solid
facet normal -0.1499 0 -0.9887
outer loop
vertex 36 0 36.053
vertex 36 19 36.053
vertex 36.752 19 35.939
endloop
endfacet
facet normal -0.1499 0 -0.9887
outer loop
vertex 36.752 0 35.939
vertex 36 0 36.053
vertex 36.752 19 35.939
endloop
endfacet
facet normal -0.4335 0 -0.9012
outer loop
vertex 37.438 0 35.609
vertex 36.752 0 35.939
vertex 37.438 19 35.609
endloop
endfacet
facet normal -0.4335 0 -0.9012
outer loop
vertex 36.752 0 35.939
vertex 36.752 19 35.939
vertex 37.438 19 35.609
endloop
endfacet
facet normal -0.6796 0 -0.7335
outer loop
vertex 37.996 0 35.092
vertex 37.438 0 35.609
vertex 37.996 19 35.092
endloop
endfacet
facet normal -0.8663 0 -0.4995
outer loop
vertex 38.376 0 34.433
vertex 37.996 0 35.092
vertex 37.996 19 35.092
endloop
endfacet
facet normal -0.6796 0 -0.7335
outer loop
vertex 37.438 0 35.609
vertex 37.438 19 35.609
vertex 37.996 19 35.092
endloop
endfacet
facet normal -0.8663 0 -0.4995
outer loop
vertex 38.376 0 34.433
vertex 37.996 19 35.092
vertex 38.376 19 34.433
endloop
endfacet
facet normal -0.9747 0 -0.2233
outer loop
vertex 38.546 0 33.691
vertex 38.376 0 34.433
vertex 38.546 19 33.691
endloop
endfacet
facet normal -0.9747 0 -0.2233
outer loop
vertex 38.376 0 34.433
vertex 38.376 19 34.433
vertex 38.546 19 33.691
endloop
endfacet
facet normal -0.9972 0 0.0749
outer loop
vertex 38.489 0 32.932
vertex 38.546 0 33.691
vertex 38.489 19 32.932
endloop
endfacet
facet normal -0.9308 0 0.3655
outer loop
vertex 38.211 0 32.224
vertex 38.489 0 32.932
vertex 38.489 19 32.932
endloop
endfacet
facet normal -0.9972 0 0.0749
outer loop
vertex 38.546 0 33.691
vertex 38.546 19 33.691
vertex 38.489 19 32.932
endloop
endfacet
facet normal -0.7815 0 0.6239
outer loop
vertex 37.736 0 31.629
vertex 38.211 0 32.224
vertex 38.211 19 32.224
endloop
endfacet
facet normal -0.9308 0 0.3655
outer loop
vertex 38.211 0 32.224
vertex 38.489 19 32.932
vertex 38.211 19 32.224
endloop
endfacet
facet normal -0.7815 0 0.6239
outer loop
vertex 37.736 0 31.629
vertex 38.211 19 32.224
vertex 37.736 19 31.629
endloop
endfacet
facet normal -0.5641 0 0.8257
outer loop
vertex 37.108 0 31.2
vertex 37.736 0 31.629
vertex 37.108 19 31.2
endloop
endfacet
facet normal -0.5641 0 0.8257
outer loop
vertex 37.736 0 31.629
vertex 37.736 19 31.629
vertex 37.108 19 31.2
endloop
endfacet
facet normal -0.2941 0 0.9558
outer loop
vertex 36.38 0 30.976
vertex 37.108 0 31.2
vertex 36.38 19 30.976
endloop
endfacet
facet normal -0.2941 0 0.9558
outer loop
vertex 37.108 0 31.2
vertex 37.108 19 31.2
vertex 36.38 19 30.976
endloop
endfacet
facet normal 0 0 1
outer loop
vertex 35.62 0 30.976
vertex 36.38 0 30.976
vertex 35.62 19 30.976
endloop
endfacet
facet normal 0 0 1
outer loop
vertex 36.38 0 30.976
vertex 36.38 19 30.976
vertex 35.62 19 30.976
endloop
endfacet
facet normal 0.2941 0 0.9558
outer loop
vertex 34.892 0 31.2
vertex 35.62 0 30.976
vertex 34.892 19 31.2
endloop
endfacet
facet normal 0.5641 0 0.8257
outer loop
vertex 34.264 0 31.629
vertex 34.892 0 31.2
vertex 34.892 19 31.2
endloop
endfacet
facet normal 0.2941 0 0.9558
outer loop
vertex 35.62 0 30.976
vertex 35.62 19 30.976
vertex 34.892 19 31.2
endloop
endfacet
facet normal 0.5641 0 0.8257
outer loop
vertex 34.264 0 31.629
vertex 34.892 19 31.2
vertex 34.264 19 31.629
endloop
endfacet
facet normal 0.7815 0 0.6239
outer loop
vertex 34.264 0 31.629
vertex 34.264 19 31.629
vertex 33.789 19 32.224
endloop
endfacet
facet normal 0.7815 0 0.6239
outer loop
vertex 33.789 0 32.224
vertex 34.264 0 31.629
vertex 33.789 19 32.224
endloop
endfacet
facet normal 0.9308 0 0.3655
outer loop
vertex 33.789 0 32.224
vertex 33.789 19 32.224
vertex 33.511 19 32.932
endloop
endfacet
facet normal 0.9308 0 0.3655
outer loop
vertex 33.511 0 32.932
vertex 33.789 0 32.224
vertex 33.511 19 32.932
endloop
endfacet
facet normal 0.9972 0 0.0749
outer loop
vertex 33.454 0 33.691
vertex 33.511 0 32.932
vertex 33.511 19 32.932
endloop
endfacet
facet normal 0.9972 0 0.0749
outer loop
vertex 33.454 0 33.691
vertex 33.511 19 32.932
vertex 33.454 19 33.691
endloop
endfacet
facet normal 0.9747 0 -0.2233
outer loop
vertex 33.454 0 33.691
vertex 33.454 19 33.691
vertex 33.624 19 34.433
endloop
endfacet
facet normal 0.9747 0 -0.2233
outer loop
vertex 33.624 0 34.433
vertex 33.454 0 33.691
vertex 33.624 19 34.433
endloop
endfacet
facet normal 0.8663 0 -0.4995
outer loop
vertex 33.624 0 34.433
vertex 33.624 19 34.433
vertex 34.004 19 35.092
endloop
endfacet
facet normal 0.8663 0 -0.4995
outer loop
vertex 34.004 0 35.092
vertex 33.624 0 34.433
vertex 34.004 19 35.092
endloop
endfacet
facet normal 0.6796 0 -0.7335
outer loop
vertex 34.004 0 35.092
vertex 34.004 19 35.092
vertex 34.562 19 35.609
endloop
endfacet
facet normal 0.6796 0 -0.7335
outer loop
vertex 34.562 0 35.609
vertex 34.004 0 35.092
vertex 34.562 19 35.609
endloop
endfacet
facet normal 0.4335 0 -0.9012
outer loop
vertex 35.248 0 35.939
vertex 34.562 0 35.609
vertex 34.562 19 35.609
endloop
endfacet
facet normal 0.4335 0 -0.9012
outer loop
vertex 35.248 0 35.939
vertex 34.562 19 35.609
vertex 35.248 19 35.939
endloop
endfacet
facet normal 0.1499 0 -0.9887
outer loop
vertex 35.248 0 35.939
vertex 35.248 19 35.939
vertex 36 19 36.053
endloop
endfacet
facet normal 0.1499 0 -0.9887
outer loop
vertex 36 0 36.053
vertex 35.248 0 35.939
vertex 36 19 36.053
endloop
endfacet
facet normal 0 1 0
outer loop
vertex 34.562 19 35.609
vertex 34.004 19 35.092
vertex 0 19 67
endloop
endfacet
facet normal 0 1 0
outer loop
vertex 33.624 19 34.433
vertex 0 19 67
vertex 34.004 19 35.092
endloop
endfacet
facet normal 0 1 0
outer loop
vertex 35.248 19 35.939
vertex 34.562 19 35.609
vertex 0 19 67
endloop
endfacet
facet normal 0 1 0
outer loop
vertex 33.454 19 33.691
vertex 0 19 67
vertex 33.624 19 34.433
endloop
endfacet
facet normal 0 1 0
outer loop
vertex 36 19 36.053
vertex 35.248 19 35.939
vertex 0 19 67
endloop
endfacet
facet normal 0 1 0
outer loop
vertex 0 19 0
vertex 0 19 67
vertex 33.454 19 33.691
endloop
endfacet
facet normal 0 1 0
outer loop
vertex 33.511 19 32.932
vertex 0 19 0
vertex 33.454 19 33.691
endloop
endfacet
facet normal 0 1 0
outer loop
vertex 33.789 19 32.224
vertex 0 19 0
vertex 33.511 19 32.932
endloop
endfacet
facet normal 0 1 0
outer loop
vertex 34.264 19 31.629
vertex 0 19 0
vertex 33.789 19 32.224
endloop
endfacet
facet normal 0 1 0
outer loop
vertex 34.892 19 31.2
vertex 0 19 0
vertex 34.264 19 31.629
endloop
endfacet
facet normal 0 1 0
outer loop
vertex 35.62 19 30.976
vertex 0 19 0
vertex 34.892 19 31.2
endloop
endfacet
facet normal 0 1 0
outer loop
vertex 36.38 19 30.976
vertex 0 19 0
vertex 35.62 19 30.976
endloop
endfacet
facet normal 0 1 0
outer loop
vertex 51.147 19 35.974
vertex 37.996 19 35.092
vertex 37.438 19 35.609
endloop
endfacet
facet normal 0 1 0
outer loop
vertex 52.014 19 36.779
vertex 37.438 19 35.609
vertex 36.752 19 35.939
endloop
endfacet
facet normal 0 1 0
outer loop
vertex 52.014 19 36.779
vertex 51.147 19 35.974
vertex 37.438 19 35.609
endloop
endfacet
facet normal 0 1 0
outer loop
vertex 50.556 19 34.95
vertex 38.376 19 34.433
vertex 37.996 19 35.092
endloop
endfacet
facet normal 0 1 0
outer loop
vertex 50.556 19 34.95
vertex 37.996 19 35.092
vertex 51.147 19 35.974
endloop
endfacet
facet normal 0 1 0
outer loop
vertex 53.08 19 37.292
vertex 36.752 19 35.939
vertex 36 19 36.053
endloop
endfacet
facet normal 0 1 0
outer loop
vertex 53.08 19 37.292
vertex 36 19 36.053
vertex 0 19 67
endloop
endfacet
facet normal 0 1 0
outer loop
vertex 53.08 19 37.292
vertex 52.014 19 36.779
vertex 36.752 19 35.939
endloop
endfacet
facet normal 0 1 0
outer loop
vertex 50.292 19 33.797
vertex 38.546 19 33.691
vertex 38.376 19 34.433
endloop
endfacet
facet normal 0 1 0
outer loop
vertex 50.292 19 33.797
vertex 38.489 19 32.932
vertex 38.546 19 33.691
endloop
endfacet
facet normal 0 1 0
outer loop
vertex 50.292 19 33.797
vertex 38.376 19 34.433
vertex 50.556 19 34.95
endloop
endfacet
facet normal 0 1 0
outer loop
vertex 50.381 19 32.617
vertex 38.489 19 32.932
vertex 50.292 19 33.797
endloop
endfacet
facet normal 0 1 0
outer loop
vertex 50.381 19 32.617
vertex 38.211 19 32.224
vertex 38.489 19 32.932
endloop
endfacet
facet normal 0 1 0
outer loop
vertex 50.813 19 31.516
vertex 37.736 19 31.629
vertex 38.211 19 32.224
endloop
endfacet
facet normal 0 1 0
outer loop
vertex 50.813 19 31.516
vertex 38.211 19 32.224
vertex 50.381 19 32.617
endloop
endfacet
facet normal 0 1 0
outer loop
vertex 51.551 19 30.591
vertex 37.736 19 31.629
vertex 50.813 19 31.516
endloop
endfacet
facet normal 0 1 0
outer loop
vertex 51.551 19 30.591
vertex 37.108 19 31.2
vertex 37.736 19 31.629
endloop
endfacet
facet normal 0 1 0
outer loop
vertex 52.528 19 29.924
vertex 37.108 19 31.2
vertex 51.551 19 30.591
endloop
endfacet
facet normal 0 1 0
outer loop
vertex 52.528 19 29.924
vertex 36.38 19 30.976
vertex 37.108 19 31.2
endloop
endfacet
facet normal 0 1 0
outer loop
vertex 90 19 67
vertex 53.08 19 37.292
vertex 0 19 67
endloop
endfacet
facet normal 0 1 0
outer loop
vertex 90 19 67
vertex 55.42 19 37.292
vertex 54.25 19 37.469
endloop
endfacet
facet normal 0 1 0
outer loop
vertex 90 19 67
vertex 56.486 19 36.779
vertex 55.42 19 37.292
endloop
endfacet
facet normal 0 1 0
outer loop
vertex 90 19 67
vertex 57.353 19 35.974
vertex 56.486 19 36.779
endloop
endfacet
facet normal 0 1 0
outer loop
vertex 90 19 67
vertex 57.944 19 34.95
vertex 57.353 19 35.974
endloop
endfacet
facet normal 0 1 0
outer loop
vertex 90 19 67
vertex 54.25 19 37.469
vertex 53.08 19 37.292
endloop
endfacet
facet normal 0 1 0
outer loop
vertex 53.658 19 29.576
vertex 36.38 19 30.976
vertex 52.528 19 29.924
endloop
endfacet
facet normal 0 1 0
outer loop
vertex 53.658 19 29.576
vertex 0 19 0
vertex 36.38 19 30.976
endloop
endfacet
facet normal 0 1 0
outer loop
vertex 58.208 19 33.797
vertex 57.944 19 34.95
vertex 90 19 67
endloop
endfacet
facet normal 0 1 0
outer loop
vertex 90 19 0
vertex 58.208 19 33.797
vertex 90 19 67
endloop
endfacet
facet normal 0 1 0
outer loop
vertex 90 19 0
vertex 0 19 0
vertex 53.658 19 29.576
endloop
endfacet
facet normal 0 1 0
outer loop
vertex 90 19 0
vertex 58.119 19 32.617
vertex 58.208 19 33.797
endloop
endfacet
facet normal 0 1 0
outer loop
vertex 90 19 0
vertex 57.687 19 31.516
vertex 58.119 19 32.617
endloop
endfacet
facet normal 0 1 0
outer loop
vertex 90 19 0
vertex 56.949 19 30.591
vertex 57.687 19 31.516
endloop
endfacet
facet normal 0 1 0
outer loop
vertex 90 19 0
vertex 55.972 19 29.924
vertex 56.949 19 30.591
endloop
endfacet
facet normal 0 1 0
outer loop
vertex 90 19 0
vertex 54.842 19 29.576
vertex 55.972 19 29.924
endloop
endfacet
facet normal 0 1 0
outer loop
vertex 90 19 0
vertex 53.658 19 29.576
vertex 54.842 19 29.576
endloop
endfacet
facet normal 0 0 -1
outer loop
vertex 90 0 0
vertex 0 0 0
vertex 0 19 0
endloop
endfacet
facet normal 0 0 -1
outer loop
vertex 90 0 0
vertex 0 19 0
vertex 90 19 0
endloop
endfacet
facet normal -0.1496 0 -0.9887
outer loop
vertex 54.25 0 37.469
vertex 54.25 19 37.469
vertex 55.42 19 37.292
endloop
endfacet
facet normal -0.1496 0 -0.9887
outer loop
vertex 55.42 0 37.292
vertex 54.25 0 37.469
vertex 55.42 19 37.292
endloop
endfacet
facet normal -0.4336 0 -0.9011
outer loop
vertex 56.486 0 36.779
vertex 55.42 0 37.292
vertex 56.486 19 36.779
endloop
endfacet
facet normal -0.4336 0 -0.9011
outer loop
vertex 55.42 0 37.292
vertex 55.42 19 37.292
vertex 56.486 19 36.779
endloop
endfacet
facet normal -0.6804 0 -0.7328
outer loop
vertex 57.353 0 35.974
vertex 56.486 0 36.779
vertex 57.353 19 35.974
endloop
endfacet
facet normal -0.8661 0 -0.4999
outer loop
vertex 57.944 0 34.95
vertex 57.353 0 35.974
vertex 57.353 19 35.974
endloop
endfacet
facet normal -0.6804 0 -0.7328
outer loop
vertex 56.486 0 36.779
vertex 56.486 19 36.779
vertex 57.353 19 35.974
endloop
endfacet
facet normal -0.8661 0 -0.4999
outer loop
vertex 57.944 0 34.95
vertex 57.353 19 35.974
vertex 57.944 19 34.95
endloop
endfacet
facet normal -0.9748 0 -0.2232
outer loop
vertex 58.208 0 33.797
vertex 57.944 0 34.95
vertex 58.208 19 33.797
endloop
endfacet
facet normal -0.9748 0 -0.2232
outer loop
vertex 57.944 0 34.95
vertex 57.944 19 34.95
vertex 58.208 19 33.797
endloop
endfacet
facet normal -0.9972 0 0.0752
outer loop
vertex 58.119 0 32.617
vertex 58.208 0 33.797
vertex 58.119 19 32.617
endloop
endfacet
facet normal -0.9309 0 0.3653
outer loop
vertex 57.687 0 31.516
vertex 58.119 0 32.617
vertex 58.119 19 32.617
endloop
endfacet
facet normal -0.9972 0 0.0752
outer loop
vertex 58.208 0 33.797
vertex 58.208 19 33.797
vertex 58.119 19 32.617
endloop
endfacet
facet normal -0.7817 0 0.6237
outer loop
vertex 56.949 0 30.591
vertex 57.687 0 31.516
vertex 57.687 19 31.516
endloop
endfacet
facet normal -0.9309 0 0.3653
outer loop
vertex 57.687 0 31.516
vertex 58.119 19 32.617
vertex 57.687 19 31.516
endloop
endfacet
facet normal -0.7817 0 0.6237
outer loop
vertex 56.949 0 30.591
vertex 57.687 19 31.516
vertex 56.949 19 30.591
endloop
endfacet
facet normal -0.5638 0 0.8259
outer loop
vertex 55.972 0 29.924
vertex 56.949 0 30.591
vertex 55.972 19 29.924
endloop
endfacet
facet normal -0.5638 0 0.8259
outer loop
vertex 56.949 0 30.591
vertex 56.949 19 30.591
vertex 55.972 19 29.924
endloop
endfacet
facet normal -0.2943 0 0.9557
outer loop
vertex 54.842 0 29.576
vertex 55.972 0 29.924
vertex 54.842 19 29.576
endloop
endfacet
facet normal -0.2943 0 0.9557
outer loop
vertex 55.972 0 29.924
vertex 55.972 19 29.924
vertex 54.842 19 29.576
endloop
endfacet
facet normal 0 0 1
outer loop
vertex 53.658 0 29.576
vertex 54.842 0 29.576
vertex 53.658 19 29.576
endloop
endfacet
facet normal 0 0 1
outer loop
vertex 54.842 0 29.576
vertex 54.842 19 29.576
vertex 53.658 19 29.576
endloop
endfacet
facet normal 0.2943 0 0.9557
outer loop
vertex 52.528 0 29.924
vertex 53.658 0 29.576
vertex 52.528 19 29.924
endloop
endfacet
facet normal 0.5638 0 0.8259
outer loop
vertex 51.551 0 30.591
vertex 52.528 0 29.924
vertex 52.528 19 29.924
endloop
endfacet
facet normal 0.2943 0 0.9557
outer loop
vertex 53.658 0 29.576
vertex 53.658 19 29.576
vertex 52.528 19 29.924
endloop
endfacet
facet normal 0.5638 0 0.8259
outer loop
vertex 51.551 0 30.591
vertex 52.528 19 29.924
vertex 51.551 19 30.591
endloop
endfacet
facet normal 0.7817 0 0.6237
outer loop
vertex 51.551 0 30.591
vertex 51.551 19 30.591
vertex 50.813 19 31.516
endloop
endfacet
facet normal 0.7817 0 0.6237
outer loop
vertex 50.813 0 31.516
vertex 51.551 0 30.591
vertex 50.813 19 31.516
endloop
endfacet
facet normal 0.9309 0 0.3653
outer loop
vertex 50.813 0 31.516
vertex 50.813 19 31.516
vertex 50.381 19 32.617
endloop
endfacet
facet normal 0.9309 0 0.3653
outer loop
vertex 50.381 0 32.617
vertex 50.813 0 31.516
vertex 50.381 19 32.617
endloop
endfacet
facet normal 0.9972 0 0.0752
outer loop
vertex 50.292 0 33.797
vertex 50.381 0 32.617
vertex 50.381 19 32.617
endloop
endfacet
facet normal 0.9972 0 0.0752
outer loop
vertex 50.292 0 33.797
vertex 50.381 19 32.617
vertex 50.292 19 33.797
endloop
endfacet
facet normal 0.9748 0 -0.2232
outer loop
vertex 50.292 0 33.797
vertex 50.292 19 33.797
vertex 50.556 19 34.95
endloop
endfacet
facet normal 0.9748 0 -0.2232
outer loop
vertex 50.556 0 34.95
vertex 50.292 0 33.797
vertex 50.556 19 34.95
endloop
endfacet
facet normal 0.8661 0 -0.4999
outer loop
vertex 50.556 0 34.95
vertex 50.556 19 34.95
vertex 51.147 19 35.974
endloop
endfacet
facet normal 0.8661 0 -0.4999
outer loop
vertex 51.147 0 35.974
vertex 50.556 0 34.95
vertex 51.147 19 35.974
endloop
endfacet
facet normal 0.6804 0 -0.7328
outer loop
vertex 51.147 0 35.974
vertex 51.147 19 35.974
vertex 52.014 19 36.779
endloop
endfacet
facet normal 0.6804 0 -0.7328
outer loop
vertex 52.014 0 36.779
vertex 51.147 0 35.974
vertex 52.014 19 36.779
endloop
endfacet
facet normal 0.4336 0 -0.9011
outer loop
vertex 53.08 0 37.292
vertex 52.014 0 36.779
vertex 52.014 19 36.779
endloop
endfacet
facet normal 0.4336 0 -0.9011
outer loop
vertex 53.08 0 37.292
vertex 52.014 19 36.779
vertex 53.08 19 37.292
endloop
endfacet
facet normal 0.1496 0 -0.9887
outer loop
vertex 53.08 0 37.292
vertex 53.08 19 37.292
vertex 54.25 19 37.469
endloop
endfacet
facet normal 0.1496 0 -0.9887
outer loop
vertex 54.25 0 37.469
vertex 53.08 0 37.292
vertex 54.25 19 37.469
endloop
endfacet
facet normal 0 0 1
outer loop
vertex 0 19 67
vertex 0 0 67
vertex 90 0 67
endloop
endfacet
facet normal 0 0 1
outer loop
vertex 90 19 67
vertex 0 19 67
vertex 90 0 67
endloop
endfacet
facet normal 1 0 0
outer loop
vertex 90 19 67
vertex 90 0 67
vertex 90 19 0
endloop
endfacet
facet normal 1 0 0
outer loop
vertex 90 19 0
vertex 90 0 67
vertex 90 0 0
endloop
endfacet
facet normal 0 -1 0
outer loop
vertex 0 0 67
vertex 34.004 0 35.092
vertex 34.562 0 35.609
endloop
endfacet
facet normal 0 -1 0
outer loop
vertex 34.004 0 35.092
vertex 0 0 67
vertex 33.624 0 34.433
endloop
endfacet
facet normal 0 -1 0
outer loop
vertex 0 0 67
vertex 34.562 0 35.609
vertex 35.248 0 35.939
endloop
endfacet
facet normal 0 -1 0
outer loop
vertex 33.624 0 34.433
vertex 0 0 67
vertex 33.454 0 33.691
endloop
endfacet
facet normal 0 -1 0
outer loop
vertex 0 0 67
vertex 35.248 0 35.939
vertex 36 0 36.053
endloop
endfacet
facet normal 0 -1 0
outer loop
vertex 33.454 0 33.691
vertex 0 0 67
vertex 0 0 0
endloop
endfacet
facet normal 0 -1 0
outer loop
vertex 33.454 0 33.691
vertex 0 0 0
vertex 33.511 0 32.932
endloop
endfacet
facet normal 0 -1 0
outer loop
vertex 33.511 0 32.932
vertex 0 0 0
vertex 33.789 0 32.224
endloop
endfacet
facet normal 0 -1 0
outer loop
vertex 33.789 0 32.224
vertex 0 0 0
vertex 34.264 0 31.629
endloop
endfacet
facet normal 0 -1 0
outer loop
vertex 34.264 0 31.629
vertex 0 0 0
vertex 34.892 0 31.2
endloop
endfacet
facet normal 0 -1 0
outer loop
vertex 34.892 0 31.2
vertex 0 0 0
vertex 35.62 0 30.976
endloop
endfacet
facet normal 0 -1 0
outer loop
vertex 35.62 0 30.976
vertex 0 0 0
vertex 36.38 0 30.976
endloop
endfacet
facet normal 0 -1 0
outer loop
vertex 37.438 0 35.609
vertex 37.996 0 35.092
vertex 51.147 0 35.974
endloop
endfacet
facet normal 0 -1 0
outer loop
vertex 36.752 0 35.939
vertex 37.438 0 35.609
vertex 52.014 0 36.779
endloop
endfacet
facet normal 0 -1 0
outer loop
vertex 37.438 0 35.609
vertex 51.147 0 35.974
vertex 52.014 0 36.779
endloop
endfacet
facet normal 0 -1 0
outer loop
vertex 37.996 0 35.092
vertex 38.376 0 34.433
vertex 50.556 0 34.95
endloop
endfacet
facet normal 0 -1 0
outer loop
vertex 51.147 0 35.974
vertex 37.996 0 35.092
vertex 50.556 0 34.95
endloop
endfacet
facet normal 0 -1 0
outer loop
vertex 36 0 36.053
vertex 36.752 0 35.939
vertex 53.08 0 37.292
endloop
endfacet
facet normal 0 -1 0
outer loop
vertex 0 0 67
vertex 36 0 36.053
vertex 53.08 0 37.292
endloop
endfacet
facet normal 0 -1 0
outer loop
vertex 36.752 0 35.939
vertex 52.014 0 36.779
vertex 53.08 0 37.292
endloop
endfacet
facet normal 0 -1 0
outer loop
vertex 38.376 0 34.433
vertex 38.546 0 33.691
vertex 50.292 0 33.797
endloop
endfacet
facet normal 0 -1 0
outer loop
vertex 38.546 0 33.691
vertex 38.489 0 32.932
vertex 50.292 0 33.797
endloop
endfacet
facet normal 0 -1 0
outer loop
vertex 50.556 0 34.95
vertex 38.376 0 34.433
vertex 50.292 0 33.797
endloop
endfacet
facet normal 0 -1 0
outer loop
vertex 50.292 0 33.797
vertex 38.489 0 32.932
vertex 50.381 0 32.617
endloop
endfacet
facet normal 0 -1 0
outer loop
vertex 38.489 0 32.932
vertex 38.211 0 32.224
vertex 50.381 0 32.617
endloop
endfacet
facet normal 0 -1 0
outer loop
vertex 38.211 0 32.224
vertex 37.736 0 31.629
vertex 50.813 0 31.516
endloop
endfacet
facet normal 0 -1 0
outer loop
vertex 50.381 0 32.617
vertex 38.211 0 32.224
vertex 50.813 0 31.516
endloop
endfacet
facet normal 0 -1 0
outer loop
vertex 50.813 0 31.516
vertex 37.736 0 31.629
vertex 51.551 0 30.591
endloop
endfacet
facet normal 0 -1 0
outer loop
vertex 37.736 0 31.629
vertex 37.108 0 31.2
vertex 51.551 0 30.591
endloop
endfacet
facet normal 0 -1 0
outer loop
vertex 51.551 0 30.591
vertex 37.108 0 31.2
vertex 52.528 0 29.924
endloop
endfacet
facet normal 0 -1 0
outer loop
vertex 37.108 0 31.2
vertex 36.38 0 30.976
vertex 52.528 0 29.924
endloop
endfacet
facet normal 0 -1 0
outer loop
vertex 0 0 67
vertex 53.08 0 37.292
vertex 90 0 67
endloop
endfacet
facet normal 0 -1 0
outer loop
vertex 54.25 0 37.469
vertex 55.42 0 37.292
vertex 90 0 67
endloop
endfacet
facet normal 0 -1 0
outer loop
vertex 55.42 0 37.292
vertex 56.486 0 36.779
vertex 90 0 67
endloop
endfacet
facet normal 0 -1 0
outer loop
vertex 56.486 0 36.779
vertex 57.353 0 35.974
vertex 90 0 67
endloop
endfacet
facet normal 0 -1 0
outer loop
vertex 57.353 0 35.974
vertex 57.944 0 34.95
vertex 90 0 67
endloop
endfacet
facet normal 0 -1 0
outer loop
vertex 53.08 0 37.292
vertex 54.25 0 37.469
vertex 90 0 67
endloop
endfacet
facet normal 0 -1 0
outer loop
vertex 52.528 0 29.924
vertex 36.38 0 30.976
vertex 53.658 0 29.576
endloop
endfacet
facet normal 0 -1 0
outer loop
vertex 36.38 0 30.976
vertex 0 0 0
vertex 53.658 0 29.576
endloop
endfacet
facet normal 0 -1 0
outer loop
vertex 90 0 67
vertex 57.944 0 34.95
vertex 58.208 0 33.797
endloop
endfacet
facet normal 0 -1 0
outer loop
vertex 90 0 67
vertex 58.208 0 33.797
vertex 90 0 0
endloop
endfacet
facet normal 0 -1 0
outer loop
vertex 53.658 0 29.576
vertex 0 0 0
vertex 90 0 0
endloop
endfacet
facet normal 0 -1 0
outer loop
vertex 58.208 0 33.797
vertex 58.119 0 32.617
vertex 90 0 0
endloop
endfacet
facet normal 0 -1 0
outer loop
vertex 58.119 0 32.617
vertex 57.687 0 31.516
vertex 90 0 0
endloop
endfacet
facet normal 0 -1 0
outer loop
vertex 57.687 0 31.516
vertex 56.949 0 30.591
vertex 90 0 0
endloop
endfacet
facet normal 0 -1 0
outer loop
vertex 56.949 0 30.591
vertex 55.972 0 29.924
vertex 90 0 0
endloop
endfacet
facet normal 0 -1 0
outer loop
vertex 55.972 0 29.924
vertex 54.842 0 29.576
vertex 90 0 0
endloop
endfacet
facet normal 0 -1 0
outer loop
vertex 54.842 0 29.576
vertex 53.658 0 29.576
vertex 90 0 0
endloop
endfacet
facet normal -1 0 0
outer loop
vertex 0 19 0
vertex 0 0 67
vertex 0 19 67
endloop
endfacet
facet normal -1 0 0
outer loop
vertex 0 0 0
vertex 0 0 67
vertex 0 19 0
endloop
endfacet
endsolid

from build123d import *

# Parameters (mm, degrees)
SKETCH_1_W            = 90
SKETCH_1_H            = 67
EXTRUDE_1_DEPTH       = 19
HOLE_WIZARD_1_4_201_D = 5.1054
HOLE_WIZARD_3_8_161_D = 7.9375


with BuildPart() as part:
    # Эскиз1 → Бобышка-Вытянуть1 (new body)
    with BuildSketch(Plane(origin=(0, 0, 0), x_dir=(1, 0, 0), z_dir=(0, 1, 0))):
        with Locations((45, -33.5)):
            Rectangle(SKETCH_1_W, SKETCH_1_H)
    extrude(amount=EXTRUDE_1_DEPTH)

    # Отверстие обработанное метчиком 1/4-201 (through all)
    with Locations(Plane(origin=(36, 0, 33.5), x_dir=(0, 0, -1), z_dir=(0, -1, 0))):
        with Locations((0, 0)):
            Hole(HOLE_WIZARD_1_4_201_D / 2)

    # Отверстие обработанное метчиком 3/8-161 (through all)
    with Locations(Plane(origin=(54.25, 0, 33.5), x_dir=(0, 0, -1), z_dir=(0, -1, 0))):
        with Locations((0, 0)):
            Hole(HOLE_WIZARD_3_8_161_D / 2)


solid = part.part
